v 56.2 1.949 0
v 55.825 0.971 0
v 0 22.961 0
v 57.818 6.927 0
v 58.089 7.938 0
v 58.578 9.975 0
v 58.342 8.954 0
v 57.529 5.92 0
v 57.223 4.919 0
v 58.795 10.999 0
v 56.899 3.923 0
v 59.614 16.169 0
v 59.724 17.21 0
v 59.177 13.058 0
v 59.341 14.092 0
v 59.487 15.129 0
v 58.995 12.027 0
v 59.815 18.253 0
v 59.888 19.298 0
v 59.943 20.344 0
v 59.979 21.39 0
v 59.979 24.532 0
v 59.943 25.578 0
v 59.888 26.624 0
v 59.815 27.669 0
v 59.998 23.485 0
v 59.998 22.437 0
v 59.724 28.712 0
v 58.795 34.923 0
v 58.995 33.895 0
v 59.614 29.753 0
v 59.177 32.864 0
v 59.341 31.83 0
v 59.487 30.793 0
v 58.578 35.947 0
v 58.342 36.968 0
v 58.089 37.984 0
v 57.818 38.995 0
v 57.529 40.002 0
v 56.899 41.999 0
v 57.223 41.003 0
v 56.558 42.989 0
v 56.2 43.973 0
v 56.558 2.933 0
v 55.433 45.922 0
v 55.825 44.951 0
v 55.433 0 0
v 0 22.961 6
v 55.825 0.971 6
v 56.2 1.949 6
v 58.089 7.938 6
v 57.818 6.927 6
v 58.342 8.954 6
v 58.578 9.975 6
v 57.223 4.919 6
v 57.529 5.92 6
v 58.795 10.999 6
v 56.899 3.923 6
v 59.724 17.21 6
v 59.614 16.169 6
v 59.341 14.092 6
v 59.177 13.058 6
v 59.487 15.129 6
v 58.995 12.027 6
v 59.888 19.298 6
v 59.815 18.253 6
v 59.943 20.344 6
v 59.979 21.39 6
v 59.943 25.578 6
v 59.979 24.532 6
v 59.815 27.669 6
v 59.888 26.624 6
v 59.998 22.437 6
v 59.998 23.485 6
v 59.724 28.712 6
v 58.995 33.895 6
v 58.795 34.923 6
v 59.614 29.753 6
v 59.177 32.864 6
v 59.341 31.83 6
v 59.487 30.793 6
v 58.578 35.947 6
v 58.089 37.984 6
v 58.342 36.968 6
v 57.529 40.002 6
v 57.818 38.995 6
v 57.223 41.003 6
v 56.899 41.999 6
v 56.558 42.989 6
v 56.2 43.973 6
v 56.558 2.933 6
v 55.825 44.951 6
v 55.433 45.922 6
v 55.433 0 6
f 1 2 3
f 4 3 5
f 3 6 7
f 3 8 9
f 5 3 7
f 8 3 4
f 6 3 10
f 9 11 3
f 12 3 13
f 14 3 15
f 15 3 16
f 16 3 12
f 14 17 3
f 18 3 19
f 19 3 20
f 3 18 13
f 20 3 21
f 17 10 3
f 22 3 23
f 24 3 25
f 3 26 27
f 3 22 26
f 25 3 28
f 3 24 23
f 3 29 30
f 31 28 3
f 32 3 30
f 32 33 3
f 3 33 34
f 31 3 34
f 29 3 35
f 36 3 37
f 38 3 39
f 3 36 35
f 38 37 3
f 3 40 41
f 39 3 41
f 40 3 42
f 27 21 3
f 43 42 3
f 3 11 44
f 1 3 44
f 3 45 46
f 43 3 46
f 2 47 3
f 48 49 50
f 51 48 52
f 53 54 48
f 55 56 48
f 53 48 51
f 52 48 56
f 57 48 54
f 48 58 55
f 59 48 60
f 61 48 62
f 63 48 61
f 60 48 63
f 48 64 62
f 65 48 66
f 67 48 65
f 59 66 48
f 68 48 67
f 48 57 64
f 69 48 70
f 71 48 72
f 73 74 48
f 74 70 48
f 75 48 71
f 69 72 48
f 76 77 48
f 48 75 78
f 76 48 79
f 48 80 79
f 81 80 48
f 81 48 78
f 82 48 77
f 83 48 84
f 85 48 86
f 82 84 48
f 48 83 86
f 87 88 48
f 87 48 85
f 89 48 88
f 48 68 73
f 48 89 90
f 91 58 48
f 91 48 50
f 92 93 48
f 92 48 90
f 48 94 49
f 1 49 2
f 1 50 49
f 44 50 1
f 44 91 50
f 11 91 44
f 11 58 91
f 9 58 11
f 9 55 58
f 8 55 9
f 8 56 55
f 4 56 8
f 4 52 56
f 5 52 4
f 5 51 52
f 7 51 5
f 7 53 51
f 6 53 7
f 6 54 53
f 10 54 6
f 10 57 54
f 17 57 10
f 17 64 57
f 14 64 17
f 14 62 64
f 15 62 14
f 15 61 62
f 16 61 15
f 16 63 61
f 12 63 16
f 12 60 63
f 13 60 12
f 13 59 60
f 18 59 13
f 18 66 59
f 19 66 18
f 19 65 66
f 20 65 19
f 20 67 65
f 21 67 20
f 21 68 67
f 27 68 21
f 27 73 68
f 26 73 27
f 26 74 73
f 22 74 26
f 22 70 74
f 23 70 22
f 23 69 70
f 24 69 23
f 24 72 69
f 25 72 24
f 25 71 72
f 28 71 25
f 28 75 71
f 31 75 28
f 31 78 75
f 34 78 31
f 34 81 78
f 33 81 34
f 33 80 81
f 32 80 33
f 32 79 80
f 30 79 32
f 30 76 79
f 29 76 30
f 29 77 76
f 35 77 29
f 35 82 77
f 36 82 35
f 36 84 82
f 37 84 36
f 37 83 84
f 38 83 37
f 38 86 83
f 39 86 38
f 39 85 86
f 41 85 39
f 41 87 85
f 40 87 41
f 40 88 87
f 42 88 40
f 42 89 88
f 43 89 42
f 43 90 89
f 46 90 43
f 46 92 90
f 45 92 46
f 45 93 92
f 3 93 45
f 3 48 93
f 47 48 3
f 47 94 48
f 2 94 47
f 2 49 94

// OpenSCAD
$fn = 32;

// ----------------------------------------------------------------------
// Arc profile plate: sector, 47 points
// ----------------------------------------------------------------------

// --- parameters (mm) ---
sector_angle = 45;        // sector angle, degrees
sector_r = 60;            // outer radius
arc_step = 1;             // sampling step of the arc, degrees
plate_t = 6;              // plate thickness, Z

bbox_x = 2 * sector_r * sin(sector_angle / 2);  // chord of the sector
bbox_y = sector_r;  // depth of the sector (apex to arc)

profile = [[55.433, 0], [55.825, 0.971], [56.2, 1.949], [56.558, 2.933], [56.899, 3.923], [57.223, 4.919], [57.529, 5.92], [57.818, 6.927], [58.089, 7.938], [58.342, 8.954], [58.578, 9.975], [58.795, 10.999], [58.995, 12.027], [59.177, 13.058], [59.341, 14.092], [59.487, 15.129], [59.614, 16.169], [59.724, 17.21], [59.815, 18.253], [59.888, 19.298], [59.943, 20.344], [59.979, 21.39], [59.998, 22.437], [59.998, 23.485], [59.979, 24.532], [59.943, 25.578], [59.888, 26.624], [59.815, 27.669], [59.724, 28.712], [59.614, 29.753], [59.487, 30.793], [59.341, 31.83], [59.177, 32.864], [58.995, 33.895], [58.795, 34.923], [58.578, 35.947], [58.342, 36.968], [58.089, 37.984], [57.818, 38.995], [57.529, 40.002], [57.223, 41.003], [56.899, 41.999], [56.558, 42.989], [56.2, 43.973], [55.825, 44.951], [55.433, 45.922], [0, 22.961]];  // primary outline, 47 points, counter clockwise

// --- the one profile operation ---
linear_extrude(height = plate_t) polygon(points = profile);
